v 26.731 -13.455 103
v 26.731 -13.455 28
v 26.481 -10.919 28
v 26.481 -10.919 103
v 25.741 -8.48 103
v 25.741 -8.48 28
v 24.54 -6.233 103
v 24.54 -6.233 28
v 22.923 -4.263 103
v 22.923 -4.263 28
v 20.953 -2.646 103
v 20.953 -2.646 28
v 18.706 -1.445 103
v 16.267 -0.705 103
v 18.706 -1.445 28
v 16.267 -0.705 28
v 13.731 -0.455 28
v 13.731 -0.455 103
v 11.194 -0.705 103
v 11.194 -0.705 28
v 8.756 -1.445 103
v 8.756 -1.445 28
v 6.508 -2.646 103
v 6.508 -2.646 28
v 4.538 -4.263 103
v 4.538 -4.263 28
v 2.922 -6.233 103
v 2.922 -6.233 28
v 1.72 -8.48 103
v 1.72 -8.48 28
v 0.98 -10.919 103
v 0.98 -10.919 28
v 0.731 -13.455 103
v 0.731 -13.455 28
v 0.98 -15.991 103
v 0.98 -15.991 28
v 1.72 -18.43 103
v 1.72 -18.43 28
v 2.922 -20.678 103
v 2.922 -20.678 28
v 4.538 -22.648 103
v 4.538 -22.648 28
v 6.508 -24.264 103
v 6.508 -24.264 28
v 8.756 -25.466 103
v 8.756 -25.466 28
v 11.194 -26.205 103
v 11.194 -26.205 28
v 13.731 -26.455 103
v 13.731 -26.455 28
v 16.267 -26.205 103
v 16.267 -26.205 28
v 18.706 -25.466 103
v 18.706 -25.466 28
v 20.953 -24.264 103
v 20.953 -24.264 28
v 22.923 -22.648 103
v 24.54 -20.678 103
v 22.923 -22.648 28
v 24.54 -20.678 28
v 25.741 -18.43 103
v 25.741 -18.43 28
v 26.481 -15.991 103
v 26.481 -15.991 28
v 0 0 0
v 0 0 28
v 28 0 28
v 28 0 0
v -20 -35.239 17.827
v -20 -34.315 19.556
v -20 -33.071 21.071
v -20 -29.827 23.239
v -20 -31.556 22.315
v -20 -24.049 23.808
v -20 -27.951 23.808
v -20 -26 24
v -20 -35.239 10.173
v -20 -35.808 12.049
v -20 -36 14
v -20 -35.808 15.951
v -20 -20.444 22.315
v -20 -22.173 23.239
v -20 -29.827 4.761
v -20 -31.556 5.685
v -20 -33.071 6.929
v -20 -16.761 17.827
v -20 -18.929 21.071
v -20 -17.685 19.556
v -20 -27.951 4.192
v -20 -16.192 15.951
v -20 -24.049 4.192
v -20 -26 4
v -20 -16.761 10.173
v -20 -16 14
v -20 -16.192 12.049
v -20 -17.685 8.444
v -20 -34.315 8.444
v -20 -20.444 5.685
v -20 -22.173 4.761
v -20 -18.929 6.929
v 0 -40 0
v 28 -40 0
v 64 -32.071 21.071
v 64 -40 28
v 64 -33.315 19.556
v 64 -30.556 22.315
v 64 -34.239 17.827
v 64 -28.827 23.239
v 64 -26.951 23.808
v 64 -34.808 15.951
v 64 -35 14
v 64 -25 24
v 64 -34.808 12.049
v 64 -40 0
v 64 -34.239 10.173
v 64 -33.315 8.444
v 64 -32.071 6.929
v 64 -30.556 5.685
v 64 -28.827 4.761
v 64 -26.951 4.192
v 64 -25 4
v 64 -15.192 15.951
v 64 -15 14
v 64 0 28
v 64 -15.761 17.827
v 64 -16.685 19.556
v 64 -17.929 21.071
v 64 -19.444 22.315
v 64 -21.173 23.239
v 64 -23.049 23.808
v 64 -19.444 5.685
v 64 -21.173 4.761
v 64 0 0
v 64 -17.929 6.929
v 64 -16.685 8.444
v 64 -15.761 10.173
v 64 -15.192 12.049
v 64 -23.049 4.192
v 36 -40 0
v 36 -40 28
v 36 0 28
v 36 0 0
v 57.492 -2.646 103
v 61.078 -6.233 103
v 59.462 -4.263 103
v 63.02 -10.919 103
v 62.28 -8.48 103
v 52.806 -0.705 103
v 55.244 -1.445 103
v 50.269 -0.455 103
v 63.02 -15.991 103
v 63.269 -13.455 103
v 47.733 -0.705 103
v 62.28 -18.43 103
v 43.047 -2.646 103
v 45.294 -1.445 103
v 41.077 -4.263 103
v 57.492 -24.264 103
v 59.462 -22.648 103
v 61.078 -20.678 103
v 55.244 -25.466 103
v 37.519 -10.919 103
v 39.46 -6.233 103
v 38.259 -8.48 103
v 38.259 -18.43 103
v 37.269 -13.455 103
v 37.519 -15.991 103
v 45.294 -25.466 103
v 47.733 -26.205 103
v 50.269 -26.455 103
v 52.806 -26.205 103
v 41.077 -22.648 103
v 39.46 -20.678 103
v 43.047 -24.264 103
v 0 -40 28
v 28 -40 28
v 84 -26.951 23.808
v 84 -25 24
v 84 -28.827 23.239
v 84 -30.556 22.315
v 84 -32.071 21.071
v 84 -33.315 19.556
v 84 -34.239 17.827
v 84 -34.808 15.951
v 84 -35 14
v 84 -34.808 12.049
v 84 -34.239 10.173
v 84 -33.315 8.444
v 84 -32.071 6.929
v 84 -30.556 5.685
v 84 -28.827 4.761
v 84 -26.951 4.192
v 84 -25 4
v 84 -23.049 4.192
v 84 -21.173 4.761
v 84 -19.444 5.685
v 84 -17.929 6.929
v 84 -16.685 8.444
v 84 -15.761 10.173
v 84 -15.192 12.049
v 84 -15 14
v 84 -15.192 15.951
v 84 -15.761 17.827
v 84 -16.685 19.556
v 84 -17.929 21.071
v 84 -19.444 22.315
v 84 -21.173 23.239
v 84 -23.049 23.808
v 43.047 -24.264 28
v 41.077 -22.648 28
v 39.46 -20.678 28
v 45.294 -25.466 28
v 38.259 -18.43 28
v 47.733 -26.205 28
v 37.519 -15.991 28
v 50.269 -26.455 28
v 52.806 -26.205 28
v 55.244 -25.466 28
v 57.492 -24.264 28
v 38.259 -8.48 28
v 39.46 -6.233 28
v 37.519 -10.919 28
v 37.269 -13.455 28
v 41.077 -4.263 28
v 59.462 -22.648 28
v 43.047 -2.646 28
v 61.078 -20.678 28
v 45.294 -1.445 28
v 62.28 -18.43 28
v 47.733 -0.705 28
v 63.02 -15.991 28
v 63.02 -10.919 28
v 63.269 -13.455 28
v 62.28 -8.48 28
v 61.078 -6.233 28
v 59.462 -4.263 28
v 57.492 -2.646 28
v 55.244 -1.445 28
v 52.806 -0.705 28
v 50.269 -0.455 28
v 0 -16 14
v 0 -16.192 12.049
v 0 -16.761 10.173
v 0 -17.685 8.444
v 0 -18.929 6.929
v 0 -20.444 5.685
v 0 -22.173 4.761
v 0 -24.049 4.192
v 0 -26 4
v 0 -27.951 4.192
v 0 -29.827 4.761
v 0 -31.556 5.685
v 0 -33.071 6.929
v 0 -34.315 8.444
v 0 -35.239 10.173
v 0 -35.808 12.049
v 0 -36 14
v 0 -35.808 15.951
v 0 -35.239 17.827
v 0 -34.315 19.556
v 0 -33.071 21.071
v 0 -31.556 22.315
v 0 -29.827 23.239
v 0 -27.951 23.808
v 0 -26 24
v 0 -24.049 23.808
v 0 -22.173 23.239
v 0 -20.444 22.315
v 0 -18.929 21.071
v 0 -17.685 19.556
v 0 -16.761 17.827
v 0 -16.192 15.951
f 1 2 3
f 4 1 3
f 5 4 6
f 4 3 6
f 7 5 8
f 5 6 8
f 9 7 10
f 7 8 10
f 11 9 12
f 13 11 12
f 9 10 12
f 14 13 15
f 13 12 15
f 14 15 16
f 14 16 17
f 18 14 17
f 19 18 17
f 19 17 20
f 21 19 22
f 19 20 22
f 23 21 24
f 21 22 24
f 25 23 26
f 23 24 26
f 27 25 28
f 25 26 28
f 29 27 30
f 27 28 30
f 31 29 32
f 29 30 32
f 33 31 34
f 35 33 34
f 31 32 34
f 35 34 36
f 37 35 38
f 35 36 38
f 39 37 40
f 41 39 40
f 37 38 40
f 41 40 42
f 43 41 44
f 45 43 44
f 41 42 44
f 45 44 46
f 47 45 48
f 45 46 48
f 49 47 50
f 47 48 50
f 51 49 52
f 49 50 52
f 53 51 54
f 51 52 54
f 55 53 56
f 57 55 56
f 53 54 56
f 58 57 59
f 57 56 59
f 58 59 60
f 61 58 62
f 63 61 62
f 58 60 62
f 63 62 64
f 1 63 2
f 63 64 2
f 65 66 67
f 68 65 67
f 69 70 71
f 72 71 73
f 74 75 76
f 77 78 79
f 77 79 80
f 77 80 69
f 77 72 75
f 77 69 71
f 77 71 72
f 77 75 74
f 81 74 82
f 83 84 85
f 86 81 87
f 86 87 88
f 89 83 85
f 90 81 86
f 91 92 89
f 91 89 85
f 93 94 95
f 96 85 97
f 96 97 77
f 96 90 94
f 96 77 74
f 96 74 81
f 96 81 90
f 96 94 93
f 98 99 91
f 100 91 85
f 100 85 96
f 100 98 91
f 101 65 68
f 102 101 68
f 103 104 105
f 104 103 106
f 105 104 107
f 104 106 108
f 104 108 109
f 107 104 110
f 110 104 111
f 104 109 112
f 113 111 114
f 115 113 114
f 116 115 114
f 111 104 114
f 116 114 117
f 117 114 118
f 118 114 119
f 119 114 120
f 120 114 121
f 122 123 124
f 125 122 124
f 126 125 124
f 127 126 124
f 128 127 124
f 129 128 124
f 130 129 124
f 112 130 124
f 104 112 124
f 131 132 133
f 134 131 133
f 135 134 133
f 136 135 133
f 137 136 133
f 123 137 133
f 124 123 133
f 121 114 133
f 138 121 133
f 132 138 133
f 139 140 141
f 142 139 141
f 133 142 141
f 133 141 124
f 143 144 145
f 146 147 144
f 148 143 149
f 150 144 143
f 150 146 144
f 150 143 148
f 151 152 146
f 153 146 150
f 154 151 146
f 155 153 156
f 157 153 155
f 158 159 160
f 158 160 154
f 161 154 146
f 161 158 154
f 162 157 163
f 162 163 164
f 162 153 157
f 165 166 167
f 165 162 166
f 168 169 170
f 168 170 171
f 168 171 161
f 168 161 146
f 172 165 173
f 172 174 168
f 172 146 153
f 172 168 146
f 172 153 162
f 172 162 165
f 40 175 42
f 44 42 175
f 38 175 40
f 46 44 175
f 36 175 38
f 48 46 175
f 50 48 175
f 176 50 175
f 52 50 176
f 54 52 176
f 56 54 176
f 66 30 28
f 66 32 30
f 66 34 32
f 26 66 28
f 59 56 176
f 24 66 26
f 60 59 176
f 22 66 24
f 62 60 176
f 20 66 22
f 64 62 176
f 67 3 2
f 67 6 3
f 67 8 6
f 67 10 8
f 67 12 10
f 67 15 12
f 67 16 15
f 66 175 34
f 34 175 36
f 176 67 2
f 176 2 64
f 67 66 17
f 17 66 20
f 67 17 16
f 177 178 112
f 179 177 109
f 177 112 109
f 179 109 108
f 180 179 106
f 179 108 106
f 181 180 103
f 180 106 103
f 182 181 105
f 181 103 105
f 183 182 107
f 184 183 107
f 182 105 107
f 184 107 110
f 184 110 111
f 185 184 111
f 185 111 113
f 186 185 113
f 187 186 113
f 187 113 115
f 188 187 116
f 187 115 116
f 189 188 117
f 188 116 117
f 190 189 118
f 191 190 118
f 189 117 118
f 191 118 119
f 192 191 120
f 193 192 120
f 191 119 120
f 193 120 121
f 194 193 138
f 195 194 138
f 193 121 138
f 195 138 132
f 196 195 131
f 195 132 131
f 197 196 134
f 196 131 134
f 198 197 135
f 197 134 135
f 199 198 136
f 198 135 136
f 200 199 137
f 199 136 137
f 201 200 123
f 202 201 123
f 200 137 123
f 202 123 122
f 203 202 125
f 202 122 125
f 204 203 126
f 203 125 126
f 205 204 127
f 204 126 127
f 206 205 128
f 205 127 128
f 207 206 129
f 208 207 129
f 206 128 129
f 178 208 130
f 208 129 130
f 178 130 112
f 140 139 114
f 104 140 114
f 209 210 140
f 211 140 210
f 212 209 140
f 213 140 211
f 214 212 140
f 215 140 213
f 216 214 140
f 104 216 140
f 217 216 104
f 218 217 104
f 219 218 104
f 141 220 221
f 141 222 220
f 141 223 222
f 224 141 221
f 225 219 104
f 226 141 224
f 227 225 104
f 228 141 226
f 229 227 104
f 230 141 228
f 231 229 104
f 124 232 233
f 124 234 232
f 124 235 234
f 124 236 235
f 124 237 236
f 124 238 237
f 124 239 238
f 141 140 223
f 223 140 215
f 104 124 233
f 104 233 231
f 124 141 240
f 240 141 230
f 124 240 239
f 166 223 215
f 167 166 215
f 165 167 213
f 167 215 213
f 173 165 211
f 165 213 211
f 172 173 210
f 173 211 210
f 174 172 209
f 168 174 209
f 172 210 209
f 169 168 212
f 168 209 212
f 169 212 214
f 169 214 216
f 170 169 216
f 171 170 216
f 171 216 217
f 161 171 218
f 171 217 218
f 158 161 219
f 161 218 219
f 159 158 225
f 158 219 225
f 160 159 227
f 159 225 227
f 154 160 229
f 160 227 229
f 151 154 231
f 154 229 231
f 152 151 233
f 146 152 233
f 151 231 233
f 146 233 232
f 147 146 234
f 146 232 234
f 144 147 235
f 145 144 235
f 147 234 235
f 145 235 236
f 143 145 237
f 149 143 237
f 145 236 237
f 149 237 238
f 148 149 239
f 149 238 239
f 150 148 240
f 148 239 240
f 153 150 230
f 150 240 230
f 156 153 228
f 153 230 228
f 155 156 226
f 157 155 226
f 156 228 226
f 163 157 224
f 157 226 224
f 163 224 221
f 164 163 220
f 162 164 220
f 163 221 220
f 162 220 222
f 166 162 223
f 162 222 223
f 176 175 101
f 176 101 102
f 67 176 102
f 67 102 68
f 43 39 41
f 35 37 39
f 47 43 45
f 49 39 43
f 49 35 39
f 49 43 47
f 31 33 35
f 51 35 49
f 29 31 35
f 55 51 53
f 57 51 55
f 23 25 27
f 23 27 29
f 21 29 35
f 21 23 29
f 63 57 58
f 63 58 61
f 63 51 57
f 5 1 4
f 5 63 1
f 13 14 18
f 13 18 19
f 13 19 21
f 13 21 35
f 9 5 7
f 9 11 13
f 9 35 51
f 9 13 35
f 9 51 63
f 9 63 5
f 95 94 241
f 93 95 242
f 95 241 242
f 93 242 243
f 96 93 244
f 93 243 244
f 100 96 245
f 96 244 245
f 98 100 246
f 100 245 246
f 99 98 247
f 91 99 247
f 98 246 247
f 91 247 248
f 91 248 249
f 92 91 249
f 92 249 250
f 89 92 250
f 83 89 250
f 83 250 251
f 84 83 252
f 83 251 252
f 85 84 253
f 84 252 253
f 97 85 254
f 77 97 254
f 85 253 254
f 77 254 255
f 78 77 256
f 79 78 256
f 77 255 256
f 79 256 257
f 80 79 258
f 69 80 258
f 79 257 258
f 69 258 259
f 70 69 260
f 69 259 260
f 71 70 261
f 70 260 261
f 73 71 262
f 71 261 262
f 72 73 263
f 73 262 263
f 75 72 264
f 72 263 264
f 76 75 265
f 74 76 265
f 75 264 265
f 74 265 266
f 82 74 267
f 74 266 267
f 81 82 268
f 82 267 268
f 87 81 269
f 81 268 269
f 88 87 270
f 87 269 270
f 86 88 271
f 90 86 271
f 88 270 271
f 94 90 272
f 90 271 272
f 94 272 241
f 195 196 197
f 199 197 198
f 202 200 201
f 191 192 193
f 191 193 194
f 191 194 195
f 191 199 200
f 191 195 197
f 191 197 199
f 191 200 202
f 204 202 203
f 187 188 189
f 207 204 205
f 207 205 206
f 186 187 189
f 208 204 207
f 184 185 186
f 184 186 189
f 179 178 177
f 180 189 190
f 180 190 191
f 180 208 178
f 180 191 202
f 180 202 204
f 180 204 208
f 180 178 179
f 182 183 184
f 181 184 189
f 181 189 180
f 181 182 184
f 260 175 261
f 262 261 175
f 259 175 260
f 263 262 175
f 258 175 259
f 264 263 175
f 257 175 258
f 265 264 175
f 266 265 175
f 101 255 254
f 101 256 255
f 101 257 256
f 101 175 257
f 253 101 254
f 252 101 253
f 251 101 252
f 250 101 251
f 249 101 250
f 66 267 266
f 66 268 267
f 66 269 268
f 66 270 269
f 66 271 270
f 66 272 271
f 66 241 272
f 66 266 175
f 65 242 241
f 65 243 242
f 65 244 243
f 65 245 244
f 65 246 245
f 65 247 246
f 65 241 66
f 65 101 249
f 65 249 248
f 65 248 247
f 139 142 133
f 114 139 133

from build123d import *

# Parameters (mm, degrees)
ESQUISSE1_W             = 64
ESQUISSE1_H             = 40
BOSS_EXTRU_1_DEPTH      = 28
ESQUISSE2_R             = 13
BOSS_EXTRU_2_DEPTH      = 75
ESQUISSE3_R             = 10
BOSS_EXTRU_3_DEPTH      = 20
ESQUISSE4_R             = 10
BOSS_EXTRU_4_DEPTH      = 20
ESQUISSE9_W             = 8
ESQUISSE9_H             = 40
ENL_V_MAT_EXTRU_1_DEPTH = 28


with BuildPart() as part:
    # Esquisse1 → Boss.-Extru.1 (new body)
    with BuildSketch(Plane.XY):
        with Locations((32, -20)):
            Rectangle(ESQUISSE1_W, ESQUISSE1_H)
    extrude(amount=BOSS_EXTRU_1_DEPTH)

    # Esquisse2 → Boss.-Extru.2 (add)
    with BuildSketch(Plane.XY.offset(28)):
        with Locations((13.7306196, -13.455237163)):
            Circle(ESQUISSE2_R)
        with Locations(Location((50.2693804, -13.455237163, 0), (0, 0, 180))):
            Circle(ESQUISSE2_R)
    extrude(amount=BOSS_EXTRU_2_DEPTH)

    # Esquisse3 → Boss.-Extru.3 (add)
    with BuildSketch(Plane.ZY):
        with Locations(Location((14, -26, 0), (0, 0, 90))):
            Circle(ESQUISSE3_R)
    extrude(amount=BOSS_EXTRU_3_DEPTH)

    # Esquisse4 → Boss.-Extru.4 (add)
    with BuildSketch(Plane(origin=(64, 0, 0), x_dir=(0, 0, -1), z_dir=(1, 0, 0))):
        with Locations(Location((-14, -25, 0), (0, 0, 180))):
            Circle(ESQUISSE4_R)
    extrude(amount=BOSS_EXTRU_4_DEPTH)

    # Esquisse9 → Enlèv. mat.-Extru.1 (cut)
    with BuildSketch(Plane.XY.offset(28)):
        with Locations((32, -20)):
            Rectangle(ESQUISSE9_W, ESQUISSE9_H)
    extrude(amount=-ENL_V_MAT_EXTRU_1_DEPTH, mode=Mode.SUBTRACT)


with BuildPart() as enl_v_mat_extru_1_piece_1:
    # of the separate pieces the step leaves, piece 1, a body of its own (enl_v_mat_extru_1_pieces)
    add(part.part.solids().sort_by_distance((36, 0, 0))[0])


with BuildPart() as enl_v_mat_extru_1_piece_2:
    # of the separate pieces the step leaves, piece 2, a body of its own (enl_v_mat_extru_1_pieces)
    add(part.part.solids().sort_by_distance((0, 0, 0))[0])


solid = Compound([enl_v_mat_extru_1_piece_1.part, enl_v_mat_extru_1_piece_2.part])
